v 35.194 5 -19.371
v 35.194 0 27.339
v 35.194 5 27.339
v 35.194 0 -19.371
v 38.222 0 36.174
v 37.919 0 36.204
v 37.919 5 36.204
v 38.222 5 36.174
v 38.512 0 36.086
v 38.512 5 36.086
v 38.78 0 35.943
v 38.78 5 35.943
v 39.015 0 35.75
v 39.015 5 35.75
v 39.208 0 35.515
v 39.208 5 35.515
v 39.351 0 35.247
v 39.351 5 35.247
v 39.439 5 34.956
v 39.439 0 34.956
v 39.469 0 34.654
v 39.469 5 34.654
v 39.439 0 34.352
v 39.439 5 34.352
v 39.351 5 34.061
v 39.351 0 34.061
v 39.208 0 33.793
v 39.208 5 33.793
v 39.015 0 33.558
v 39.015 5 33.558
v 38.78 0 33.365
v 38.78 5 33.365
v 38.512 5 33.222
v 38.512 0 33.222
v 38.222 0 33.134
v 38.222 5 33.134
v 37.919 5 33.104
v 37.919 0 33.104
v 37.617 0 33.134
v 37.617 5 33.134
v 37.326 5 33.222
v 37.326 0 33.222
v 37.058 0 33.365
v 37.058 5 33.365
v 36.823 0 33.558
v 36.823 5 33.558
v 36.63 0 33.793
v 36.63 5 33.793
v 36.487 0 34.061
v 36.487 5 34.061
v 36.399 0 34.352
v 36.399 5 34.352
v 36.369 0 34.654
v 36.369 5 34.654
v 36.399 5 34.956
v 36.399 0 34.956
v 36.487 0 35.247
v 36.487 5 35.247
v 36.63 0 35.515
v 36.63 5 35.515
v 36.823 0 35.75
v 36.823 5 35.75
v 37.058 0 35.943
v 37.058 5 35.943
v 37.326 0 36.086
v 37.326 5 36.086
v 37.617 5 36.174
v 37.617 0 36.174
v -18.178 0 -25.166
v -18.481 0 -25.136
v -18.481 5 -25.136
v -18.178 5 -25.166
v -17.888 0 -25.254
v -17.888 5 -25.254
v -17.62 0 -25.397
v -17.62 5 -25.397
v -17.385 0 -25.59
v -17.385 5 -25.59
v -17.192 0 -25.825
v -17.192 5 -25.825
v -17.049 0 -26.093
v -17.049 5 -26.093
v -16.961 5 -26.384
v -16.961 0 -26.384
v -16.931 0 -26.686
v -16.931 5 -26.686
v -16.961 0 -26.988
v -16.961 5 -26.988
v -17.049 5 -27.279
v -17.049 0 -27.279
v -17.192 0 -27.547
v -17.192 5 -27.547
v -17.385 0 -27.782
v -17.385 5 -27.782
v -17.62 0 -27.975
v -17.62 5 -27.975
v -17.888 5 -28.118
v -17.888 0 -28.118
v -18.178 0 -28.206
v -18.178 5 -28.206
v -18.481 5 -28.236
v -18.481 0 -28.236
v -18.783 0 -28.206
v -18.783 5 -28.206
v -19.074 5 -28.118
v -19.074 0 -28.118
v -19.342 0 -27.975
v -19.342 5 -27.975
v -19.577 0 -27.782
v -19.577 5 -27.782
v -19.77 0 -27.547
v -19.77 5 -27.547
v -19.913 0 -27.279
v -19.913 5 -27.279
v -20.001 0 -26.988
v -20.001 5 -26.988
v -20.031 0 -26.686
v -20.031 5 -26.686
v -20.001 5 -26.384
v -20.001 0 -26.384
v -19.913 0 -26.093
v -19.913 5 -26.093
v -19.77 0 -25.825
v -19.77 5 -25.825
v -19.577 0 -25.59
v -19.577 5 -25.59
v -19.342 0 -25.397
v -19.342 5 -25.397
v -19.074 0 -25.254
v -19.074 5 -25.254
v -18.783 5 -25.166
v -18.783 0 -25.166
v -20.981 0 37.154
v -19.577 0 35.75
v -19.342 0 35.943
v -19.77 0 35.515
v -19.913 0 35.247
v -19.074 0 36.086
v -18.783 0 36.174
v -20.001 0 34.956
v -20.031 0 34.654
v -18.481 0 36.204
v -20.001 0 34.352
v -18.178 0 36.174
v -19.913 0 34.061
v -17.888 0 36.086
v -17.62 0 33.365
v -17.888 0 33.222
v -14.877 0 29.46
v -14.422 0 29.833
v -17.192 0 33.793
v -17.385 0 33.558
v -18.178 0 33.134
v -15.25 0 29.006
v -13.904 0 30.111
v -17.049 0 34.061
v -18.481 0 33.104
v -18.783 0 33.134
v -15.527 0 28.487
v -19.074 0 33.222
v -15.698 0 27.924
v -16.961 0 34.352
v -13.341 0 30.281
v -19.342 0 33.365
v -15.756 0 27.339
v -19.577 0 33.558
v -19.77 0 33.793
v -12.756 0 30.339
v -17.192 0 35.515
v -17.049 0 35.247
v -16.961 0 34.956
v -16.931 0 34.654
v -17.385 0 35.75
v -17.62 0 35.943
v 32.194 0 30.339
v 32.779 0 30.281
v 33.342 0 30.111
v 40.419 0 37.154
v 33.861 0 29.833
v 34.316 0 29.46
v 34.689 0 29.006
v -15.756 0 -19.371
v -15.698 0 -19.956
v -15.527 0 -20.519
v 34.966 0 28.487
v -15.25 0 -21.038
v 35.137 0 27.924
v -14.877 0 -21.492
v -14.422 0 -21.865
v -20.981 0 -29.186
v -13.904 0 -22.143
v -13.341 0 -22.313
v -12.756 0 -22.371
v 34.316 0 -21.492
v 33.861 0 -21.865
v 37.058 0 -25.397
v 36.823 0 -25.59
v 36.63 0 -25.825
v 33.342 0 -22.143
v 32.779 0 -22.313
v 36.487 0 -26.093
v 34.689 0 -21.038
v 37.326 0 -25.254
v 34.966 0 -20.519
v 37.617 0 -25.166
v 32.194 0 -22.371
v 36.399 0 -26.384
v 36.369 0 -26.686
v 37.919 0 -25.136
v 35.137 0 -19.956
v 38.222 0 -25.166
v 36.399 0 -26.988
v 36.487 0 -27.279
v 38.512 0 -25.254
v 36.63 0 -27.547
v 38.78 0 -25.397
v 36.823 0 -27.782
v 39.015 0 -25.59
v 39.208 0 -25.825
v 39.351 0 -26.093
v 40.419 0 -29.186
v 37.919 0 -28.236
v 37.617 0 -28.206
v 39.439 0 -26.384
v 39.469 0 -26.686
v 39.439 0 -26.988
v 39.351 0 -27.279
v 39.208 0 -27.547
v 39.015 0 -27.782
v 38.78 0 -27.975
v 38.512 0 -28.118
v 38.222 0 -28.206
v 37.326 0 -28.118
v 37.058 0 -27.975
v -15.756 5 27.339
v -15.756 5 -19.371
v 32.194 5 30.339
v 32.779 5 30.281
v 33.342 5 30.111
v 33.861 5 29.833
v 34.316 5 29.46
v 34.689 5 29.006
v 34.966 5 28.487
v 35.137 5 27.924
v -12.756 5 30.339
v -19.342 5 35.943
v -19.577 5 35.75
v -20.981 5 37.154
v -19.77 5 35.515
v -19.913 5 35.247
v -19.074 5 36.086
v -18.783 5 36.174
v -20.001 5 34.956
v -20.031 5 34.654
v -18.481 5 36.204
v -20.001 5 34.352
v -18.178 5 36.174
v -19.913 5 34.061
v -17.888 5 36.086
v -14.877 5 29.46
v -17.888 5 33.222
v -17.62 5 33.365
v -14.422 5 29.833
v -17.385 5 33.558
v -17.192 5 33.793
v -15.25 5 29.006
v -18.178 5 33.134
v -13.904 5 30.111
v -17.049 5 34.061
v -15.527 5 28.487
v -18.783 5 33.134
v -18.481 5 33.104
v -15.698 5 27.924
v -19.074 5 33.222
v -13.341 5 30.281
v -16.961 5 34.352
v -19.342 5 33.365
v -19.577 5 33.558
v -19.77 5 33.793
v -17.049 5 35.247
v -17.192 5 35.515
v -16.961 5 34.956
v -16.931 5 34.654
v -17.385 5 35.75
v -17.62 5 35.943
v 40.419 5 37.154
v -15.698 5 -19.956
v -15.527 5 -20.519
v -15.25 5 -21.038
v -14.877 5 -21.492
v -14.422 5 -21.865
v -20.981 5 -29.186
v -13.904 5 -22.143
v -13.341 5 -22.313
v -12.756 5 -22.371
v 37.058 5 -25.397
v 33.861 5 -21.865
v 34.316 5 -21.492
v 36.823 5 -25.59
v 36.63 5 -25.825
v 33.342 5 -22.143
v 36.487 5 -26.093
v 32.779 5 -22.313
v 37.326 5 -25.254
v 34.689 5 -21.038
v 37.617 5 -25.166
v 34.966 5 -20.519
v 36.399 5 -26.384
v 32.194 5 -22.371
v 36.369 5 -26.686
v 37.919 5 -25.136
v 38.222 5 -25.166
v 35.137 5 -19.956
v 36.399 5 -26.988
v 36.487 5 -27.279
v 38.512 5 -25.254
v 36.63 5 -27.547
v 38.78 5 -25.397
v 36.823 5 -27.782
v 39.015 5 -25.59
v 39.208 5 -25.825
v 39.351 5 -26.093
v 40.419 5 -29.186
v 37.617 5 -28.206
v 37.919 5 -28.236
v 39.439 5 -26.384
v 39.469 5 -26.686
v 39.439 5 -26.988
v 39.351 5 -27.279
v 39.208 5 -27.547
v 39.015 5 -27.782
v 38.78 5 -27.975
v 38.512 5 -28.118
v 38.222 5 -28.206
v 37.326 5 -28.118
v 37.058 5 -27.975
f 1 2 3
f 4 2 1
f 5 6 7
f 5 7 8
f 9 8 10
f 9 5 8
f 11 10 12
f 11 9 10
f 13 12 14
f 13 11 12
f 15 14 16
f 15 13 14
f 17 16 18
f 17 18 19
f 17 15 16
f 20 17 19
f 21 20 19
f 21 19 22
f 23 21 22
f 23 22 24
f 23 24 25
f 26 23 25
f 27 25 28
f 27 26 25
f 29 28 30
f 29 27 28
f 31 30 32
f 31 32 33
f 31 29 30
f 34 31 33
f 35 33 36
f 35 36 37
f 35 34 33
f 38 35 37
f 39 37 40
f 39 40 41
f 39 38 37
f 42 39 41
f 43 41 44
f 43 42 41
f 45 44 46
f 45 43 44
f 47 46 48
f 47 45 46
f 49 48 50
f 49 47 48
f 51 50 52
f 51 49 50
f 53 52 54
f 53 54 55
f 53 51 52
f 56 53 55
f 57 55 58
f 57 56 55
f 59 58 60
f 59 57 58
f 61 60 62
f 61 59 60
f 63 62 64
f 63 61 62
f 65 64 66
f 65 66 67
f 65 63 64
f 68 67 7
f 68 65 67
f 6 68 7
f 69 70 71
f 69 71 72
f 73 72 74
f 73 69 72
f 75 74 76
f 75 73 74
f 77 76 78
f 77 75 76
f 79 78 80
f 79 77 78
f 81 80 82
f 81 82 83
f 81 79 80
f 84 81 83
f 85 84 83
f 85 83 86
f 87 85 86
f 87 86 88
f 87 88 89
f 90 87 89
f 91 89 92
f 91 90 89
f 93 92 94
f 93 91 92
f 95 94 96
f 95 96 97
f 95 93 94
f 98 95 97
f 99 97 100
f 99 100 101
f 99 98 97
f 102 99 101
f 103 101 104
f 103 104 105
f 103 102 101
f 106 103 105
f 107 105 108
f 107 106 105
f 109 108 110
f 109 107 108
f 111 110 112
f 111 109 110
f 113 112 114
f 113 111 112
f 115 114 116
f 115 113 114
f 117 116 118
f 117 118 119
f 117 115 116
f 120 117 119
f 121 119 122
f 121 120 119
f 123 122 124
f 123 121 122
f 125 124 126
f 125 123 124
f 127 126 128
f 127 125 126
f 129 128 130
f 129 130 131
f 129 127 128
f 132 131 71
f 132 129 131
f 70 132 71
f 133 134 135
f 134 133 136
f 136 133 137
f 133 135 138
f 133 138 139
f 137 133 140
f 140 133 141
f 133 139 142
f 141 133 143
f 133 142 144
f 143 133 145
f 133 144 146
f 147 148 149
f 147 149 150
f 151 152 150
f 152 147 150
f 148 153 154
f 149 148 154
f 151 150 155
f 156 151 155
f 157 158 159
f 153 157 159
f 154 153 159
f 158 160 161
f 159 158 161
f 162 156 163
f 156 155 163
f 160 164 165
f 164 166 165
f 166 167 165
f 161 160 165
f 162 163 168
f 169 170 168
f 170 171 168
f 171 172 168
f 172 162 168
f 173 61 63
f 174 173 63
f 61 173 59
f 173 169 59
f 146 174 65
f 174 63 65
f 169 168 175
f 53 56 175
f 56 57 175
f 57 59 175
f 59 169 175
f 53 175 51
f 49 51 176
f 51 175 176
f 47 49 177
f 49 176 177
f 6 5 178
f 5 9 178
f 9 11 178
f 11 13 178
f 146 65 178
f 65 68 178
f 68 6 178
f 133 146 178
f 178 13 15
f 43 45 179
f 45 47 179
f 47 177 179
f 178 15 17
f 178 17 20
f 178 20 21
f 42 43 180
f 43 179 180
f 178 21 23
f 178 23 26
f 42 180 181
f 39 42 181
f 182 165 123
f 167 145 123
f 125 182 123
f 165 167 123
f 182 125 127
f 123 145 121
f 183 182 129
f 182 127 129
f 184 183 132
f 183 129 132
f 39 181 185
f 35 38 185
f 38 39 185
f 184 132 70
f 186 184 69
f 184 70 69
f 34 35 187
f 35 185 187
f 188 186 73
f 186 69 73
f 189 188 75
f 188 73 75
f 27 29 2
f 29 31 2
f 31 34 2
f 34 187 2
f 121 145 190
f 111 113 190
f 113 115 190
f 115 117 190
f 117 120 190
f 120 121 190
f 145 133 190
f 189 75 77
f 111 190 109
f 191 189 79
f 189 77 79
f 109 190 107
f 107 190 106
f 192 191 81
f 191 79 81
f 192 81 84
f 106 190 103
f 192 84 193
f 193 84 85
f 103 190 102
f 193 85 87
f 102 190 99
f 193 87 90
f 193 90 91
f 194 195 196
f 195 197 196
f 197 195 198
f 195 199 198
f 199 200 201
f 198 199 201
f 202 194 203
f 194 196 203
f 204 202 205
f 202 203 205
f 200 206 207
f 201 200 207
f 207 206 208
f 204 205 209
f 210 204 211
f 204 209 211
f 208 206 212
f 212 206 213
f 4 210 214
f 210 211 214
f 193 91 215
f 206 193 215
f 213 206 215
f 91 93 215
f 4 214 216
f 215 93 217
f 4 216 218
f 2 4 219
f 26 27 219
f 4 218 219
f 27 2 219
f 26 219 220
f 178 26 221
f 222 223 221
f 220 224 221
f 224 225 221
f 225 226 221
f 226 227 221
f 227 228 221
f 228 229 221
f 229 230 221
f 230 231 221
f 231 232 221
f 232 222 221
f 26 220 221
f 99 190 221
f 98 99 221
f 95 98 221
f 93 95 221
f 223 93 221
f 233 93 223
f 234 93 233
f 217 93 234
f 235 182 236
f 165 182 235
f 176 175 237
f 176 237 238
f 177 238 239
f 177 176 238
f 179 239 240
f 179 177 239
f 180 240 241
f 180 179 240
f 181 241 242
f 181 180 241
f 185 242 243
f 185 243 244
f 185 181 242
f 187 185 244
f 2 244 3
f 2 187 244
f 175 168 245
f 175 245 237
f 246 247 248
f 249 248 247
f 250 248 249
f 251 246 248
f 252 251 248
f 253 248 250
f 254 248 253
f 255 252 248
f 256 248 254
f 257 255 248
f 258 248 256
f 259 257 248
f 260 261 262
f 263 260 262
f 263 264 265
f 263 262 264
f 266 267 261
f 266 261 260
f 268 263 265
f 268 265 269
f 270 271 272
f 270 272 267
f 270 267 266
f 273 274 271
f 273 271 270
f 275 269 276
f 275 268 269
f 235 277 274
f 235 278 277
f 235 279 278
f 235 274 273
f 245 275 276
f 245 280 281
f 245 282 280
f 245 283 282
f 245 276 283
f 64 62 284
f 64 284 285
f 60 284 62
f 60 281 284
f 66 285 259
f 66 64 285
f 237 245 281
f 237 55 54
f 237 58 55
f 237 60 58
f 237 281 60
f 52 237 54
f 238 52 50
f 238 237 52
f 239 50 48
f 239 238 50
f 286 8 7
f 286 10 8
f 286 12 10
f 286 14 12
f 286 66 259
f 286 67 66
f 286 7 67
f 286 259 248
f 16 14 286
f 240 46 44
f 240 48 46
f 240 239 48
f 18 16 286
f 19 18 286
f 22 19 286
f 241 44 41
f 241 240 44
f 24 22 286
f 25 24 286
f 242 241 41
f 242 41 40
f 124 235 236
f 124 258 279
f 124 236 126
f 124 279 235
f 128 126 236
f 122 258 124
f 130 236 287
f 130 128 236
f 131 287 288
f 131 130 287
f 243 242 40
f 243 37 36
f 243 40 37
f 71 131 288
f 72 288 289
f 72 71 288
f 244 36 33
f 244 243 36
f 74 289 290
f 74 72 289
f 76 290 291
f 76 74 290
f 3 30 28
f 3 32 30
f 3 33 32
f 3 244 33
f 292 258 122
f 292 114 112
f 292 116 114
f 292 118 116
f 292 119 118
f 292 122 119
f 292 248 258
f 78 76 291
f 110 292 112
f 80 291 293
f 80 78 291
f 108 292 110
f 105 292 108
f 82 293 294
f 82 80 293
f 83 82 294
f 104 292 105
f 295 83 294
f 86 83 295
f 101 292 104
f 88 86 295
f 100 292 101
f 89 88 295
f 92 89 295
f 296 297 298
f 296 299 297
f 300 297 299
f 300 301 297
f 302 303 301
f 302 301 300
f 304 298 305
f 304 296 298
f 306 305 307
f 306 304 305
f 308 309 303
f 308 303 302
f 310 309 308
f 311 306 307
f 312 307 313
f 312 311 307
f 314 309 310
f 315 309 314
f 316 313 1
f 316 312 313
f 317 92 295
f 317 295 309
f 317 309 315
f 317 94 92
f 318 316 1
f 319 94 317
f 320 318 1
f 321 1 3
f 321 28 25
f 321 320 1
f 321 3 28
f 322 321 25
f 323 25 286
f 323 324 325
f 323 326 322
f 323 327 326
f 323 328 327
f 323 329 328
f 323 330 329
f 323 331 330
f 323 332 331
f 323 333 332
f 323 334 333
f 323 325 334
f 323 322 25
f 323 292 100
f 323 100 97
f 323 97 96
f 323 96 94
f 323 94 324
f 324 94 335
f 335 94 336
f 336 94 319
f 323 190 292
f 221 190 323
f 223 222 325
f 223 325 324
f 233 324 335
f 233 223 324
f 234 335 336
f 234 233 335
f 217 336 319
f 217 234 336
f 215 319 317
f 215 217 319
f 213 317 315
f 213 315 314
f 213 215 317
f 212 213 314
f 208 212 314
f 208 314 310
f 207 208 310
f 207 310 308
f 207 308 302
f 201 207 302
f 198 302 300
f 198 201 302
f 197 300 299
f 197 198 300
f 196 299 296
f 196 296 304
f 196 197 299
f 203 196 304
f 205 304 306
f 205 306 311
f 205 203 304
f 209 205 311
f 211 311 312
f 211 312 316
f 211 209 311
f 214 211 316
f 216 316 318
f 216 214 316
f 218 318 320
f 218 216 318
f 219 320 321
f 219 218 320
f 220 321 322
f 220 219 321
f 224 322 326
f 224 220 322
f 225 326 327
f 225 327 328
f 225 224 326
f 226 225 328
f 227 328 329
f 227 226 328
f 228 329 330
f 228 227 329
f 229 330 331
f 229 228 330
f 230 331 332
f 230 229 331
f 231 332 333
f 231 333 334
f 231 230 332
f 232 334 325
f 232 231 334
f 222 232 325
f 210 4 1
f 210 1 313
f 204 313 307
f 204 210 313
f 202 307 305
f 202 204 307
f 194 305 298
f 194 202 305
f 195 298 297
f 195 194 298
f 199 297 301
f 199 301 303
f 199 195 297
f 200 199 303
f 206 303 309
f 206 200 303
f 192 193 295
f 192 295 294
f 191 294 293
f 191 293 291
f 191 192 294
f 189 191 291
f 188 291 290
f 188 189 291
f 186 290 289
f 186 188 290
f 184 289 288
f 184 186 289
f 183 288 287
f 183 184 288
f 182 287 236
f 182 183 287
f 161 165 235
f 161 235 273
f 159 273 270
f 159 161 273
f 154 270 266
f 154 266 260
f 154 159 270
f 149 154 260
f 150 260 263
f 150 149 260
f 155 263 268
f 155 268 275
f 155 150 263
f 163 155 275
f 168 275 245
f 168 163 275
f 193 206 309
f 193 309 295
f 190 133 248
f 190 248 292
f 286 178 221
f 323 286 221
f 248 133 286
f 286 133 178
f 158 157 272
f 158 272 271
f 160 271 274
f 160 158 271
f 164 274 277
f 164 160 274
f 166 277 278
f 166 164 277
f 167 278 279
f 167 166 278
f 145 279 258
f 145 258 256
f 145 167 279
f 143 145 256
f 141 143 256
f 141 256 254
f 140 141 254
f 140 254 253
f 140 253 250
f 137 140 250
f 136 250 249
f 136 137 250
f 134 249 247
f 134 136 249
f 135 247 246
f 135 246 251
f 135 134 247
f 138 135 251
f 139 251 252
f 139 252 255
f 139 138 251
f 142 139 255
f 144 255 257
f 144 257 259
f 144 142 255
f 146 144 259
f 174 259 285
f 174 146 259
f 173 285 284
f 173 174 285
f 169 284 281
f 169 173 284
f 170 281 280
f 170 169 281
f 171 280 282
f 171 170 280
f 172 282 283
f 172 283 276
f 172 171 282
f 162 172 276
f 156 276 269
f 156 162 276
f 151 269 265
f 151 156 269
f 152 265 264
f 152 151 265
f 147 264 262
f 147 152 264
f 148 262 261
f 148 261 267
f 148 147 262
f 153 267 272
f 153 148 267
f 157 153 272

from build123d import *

# Parameters (mm, degrees)
SKETCH1_W           = 61.4
SKETCH1_H           = 66.34
SKETCH1_R           = 1.55
BOSS_EXTRUDE1_DEPTH = 5


with BuildPart() as part:
    # Sketch1 → Boss-Extrude1 (new body)
    with BuildSketch(Plane(origin=(0, 0, 0), x_dir=(1, 0, 0), z_dir=(0, 1, 0))):
        with Locations((9.719215892, -3.98392863)):
            Rectangle(SKETCH1_W, SKETCH1_H)
        with Locations(Location((-18.480784108, 26.68607137, 0), (0, 0, 270))):
            Circle(SKETCH1_R, mode=Mode.SUBTRACT)
        with Locations(Location((37.919215892, 26.68607137, 0), (0, 0, 90))):
            Circle(SKETCH1_R, mode=Mode.SUBTRACT)
        with Locations(Location((37.919215892, -34.65392863, 0), (0, 0, 270))):
            Circle(SKETCH1_R, mode=Mode.SUBTRACT)
        with Locations(Location((-18.480784108, -34.65392863, 0), (0, 0, 90))):
            Circle(SKETCH1_R, mode=Mode.SUBTRACT)
        with BuildLine():
            Line((-12.755784108, -30.33892863), (32.194215892, -30.33892863))
            ThreePointArc((32.194215892, -30.33892863), (34.315536235, -29.460248974), (35.194215892, -27.33892863))
            Line((35.194215892, -27.33892863), (35.194215892, 19.37107137))
            ThreePointArc((35.194215892, 19.37107137), (34.315536235, 21.492391714), (32.194215892, 22.37107137))
            Line((32.194215892, 22.37107137), (-12.755784108, 22.37107137))
            ThreePointArc((-12.755784108, 22.37107137), (-14.877104452, 21.492391714), (-15.755784108, 19.37107137))
            Line((-15.755784108, 19.37107137), (-15.755784108, -27.33892863))
            ThreePointArc((-15.755784108, -27.33892863), (-14.877104452, -29.460248974), (-12.755784108, -30.33892863))
        make_face(mode=Mode.SUBTRACT)
    extrude(amount=BOSS_EXTRUDE1_DEPTH)


solid = part.part
